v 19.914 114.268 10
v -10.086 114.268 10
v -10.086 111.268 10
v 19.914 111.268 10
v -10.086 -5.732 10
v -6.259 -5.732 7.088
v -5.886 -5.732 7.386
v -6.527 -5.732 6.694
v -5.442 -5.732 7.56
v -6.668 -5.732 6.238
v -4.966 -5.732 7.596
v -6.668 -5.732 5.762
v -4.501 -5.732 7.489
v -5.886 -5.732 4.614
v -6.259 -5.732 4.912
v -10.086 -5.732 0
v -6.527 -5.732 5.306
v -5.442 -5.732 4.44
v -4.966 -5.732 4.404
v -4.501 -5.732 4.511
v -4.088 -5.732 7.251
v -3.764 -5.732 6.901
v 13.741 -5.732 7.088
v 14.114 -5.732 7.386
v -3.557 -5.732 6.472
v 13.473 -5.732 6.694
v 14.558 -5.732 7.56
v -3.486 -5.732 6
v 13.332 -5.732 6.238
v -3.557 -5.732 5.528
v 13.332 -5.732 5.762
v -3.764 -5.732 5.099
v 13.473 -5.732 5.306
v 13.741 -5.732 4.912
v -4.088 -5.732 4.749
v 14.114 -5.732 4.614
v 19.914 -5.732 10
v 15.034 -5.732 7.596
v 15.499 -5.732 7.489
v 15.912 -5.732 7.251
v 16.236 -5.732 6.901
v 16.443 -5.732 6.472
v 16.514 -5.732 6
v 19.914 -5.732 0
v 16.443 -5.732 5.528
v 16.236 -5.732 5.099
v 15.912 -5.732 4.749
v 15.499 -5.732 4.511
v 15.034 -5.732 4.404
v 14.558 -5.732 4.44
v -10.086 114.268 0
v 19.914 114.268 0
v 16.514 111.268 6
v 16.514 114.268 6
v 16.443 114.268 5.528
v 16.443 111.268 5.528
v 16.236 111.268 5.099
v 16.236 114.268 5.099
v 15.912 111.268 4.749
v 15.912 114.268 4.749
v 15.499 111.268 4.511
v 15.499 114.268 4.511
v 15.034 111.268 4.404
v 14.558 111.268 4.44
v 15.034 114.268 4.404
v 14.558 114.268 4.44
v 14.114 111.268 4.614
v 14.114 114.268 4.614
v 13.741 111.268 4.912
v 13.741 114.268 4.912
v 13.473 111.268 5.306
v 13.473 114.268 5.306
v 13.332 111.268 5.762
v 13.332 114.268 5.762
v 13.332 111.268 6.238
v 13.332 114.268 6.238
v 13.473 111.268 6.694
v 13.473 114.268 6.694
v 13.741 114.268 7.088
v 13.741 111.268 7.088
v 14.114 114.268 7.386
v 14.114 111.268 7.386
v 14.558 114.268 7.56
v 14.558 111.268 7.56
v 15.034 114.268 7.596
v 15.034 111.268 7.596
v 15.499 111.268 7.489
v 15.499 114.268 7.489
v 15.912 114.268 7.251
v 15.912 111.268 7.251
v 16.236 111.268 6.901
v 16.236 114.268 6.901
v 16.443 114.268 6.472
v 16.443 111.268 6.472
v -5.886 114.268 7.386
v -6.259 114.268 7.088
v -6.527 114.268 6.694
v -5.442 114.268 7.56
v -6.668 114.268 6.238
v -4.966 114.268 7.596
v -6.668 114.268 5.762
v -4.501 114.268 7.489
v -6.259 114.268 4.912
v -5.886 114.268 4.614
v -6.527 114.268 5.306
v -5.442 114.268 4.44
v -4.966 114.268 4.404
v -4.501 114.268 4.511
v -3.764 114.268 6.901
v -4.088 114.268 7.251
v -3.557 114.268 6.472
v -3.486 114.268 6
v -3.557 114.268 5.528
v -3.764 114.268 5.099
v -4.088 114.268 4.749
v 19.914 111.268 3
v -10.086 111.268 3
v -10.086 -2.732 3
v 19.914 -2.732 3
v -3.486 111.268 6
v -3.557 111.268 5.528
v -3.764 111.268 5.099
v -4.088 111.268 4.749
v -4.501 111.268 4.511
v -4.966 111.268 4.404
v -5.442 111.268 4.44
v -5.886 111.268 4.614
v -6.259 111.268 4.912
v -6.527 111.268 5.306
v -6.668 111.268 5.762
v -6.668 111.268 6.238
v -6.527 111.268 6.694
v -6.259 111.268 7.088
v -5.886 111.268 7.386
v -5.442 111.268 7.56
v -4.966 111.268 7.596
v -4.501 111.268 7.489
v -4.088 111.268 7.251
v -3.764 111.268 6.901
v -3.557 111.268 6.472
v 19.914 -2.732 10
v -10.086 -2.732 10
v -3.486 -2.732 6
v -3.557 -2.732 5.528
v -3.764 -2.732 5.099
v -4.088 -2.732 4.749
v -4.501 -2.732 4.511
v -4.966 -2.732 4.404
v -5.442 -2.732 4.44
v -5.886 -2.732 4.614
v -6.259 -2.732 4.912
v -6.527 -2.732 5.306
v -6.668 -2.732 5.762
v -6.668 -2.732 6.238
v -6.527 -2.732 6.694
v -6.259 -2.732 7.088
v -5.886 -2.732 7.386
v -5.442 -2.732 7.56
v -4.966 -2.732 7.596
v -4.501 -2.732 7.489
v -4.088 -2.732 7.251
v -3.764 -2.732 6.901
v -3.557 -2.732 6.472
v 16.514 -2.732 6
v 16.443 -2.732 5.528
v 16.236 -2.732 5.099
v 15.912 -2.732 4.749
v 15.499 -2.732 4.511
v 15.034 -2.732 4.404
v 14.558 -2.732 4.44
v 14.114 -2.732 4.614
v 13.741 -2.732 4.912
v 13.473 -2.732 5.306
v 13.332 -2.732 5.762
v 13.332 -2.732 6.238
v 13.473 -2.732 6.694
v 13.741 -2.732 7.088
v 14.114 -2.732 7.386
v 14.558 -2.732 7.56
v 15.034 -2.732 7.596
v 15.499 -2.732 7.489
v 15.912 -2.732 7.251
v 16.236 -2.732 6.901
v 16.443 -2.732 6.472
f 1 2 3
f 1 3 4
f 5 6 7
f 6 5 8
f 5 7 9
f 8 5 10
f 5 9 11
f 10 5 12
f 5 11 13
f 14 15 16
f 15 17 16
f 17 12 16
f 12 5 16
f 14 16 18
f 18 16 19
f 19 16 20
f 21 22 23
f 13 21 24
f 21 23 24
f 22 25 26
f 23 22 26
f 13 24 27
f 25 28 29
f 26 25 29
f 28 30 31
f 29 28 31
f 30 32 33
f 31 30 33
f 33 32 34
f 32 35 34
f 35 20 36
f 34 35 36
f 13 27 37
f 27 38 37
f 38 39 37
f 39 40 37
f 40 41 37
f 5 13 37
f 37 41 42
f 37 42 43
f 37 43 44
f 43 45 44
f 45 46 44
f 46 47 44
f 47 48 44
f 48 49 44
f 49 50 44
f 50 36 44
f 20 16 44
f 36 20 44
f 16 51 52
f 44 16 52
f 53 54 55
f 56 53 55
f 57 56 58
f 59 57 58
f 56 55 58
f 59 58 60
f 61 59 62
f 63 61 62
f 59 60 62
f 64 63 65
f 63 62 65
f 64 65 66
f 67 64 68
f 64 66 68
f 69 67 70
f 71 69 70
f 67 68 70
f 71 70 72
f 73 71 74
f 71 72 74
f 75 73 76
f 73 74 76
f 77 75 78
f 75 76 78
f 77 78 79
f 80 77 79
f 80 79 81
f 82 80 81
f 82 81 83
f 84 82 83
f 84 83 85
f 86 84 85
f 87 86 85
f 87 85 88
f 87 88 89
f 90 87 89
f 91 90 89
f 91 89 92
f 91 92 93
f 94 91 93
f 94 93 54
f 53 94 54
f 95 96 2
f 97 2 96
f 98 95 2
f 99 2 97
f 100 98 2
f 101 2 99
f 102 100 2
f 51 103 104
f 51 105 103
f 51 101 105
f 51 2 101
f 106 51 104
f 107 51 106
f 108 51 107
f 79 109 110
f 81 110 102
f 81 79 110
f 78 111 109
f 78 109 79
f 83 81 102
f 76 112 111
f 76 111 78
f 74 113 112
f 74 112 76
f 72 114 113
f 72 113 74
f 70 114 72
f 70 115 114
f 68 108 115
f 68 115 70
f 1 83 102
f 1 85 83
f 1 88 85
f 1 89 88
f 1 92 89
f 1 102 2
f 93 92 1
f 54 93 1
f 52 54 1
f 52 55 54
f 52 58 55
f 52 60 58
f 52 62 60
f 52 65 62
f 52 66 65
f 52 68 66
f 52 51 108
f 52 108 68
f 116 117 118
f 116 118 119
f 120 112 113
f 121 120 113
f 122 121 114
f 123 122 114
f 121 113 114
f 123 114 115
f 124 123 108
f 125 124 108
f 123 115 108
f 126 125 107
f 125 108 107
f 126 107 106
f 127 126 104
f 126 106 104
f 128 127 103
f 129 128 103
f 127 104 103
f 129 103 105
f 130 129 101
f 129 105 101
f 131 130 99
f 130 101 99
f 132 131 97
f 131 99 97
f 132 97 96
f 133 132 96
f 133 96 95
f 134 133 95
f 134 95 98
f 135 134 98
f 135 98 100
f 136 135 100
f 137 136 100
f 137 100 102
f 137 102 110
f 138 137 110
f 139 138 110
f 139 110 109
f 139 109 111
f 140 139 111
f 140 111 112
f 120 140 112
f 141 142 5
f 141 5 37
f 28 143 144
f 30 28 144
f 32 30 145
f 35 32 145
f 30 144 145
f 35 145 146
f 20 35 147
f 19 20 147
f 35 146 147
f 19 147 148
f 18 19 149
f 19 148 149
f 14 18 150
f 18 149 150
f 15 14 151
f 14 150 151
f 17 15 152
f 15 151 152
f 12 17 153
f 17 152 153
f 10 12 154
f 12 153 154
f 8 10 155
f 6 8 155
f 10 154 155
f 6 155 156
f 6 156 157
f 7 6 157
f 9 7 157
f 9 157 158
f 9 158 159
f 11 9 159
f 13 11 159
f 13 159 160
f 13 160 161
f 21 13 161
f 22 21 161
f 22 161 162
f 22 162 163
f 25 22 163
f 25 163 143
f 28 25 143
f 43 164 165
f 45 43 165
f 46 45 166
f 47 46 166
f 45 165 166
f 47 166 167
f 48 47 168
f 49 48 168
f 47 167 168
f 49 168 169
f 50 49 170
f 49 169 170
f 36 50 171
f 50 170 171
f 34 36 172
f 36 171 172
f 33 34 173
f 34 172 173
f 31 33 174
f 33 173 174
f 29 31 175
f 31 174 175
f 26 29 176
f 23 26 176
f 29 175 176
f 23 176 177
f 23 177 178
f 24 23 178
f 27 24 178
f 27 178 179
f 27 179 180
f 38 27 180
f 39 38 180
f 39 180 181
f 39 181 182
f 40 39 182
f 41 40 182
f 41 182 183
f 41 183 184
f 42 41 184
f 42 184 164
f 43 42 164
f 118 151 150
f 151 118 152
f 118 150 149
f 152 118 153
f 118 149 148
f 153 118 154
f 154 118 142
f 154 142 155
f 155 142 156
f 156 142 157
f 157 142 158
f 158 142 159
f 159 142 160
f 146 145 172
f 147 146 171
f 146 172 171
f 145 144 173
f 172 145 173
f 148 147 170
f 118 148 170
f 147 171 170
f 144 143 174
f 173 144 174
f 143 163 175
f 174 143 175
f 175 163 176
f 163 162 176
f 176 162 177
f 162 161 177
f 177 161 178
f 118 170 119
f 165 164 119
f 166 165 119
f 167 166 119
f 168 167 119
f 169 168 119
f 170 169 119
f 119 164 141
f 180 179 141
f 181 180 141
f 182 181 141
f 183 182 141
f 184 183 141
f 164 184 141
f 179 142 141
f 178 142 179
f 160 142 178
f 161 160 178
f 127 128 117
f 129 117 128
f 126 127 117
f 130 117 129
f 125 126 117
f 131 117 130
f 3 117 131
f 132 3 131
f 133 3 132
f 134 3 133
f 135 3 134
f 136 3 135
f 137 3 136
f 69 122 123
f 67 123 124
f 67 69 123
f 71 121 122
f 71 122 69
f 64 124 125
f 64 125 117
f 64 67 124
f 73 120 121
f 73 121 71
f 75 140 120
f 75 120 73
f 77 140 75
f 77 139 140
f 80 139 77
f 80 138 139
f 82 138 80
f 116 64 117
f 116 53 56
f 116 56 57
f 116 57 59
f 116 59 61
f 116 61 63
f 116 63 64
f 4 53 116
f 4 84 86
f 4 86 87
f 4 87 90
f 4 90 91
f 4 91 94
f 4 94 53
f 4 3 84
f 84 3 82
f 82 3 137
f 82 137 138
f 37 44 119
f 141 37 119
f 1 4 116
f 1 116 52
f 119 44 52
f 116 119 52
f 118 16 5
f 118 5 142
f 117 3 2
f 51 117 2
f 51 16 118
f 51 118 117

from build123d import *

# Parameters (mm, degrees)
SKETCH_1_W          = 30
SKETCH_1_H          = 120
EXTRUDE_1_DEPTH     = 10
SKETCH_2_W          = 30
SKETCH_2_H          = 114
CUT_EXTRUDE_1_DEPTH = 7
SKETCH_3_R          = 1.6
CUT_EXTRUDE_2_DEPTH = 121


with BuildPart() as part:
    # 草图1 → 凸台-拉伸1 (new body)
    with BuildSketch(Plane.XY):
        with Locations((4.914157805, 54.268009127)):
            Rectangle(SKETCH_1_W, SKETCH_1_H)
    extrude(amount=EXTRUDE_1_DEPTH)

    # 草图2 → 切除-拉伸1 (cut)
    with BuildSketch(Plane.XY.offset(10)):
        with Locations((4.914157805, 54.268009127)):
            Rectangle(SKETCH_2_W, SKETCH_2_H)
    extrude(amount=-CUT_EXTRUDE_1_DEPTH, mode=Mode.SUBTRACT)

    # 草图3 → 切除-拉伸2 (cut, through all)
    with BuildSketch(Plane(origin=(0, 114.268009127, 0), x_dir=(1, 0, 0), z_dir=(0, 1, 0))):
        with Locations((-5.085842195, -6)):
            Circle(SKETCH_3_R)
        with Locations((14.914157805, -6)):
            Circle(SKETCH_3_R)
    extrude(amount=-CUT_EXTRUDE_2_DEPTH, mode=Mode.SUBTRACT)


solid = part.part
